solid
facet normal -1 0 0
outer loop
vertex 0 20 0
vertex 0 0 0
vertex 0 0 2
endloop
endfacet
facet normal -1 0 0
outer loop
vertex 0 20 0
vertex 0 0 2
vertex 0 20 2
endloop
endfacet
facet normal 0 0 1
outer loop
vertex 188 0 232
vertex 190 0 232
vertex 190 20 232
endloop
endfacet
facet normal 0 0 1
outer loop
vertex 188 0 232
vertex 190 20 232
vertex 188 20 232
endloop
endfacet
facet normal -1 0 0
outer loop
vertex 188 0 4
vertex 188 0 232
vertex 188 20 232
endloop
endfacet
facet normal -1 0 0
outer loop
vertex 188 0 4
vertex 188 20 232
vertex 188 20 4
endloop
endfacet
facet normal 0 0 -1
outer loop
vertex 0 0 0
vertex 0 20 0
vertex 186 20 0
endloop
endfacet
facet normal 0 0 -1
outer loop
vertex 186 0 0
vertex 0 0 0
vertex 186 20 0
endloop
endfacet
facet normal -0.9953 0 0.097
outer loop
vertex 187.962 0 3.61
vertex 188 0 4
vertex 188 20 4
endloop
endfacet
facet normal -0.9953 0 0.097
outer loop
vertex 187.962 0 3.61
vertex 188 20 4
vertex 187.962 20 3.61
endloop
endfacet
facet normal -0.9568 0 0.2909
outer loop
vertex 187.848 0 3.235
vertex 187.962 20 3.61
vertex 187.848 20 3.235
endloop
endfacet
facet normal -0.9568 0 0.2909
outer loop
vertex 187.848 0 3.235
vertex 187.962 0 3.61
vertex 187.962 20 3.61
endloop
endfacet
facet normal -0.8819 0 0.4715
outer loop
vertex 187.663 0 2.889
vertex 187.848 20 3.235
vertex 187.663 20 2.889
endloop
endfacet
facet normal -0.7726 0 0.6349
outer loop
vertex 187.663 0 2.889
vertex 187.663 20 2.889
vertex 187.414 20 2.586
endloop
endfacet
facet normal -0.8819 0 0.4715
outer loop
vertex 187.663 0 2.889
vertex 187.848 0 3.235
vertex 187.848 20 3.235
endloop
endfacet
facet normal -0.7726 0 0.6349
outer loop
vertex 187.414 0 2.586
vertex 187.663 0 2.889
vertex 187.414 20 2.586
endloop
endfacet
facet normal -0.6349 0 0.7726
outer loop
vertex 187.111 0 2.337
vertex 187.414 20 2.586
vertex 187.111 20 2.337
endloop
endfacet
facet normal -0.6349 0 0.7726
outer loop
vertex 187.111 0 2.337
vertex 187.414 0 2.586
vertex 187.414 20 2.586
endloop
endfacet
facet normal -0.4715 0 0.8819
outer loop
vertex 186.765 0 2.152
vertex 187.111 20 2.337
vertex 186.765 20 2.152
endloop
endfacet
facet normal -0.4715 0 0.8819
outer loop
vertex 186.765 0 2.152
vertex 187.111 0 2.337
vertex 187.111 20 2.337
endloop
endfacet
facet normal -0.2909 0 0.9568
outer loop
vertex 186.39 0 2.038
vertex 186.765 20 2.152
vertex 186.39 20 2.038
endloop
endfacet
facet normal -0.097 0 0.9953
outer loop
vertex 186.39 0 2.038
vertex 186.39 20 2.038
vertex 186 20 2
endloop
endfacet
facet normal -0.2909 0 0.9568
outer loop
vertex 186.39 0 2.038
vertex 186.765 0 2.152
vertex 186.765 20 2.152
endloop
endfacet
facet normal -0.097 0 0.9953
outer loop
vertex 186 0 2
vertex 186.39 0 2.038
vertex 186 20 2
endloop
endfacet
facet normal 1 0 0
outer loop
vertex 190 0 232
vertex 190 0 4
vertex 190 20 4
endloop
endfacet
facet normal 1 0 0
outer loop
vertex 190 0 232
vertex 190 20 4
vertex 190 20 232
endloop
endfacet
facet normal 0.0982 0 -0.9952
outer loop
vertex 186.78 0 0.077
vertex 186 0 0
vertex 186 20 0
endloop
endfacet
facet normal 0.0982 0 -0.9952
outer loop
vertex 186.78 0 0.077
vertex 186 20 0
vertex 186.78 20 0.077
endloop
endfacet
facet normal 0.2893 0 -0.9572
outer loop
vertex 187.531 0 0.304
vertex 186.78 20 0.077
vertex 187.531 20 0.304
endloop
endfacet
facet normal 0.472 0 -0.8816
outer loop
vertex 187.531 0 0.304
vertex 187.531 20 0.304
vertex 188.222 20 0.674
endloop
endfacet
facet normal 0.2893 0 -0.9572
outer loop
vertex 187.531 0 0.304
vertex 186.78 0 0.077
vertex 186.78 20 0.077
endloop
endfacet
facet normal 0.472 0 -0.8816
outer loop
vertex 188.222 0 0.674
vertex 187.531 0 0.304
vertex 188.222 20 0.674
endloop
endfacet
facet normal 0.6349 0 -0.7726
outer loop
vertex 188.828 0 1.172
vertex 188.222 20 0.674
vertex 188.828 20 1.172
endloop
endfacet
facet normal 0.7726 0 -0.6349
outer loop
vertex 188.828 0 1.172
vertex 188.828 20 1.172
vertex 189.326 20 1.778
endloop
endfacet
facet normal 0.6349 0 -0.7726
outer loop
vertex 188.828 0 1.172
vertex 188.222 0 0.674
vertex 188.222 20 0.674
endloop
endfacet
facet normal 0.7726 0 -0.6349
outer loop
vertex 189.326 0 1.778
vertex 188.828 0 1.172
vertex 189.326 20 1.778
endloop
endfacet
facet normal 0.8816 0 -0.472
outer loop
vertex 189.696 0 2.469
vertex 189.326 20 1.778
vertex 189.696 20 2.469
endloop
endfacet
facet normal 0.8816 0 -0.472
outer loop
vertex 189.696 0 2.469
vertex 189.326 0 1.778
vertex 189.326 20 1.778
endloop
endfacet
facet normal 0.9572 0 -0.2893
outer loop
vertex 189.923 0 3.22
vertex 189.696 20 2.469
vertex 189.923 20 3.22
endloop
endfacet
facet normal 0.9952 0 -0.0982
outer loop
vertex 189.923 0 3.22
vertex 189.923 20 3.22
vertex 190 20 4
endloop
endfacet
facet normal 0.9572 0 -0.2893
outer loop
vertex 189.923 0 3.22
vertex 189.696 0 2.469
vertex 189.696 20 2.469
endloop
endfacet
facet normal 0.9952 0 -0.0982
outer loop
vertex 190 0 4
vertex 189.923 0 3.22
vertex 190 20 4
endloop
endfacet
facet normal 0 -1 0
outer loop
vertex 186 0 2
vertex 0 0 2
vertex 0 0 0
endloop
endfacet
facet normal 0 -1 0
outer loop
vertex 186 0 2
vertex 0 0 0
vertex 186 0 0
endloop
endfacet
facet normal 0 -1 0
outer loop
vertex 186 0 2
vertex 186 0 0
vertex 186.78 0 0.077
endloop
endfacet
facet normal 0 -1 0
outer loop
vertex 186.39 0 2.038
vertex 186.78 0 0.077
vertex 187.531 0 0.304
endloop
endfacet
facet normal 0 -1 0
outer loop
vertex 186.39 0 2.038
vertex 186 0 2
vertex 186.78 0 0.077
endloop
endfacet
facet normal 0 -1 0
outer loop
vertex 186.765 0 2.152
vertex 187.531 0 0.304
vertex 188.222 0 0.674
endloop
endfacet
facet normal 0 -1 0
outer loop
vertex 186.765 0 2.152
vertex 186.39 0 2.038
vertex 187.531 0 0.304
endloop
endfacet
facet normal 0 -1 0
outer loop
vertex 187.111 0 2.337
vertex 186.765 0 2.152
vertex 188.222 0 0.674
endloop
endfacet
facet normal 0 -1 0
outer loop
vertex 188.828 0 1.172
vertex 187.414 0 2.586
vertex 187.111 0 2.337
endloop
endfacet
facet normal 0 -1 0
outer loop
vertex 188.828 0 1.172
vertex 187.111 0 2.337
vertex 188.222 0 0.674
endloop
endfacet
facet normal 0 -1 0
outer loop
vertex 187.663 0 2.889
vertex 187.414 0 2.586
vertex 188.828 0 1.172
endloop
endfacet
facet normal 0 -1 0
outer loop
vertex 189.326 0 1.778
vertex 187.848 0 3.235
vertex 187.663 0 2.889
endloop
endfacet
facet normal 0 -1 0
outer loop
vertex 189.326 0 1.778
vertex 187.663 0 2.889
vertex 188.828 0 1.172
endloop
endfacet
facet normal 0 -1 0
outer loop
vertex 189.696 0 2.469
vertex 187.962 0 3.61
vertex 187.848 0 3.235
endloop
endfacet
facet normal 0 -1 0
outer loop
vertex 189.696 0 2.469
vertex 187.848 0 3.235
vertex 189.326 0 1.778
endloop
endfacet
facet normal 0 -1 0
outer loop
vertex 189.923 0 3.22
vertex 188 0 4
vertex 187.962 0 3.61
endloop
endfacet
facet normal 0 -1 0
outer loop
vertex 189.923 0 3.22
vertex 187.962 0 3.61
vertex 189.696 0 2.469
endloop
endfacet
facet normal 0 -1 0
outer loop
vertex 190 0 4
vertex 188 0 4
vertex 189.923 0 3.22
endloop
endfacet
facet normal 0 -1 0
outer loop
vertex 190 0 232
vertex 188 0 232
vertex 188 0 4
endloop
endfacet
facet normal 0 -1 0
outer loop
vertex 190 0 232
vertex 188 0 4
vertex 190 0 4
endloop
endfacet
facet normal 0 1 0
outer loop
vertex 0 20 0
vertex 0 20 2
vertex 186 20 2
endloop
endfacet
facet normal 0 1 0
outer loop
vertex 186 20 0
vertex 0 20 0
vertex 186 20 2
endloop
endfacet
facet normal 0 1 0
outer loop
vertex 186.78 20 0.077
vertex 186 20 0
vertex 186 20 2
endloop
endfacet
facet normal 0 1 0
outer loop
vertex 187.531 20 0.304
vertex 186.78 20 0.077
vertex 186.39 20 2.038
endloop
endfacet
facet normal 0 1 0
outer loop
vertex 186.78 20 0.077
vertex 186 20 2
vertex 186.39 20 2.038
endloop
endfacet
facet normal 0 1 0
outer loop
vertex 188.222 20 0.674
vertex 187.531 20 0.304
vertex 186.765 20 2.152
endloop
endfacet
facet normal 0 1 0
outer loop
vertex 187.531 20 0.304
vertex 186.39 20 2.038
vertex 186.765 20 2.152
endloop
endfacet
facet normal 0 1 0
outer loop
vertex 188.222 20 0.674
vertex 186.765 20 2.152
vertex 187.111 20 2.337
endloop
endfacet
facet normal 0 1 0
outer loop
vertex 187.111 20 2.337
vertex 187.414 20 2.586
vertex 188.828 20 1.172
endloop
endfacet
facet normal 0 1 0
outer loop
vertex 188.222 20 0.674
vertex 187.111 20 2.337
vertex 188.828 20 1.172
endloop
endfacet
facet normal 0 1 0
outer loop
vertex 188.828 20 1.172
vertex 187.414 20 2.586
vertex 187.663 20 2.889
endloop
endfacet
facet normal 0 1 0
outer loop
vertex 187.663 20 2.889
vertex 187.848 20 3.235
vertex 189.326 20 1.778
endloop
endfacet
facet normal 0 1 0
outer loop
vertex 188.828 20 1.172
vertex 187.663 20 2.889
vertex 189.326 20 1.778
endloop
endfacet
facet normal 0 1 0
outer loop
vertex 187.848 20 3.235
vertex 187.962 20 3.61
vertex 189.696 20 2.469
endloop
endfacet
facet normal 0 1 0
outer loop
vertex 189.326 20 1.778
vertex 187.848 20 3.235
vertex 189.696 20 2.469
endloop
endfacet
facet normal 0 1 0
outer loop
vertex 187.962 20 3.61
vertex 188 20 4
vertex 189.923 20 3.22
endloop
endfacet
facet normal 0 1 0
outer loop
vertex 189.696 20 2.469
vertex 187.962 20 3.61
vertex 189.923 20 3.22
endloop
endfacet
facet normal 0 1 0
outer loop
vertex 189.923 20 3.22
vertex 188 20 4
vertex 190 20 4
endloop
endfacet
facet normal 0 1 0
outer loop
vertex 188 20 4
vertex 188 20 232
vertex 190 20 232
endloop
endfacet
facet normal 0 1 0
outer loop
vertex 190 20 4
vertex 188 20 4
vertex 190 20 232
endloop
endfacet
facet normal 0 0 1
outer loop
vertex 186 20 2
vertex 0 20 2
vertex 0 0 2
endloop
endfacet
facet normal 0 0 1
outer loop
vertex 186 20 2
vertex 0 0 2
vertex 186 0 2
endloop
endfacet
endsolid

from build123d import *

# Parameters (mm, degrees)
SKETCH_1_W                       = 190
SKETCH_1_H                       = 20
EXTRUDE_2_DEPTH                  = 2
SM_EDGE_FLANGE_2_STRIP_W         = 12
SM_EDGE_FLANGE_2_STRIP_H         = 2
SM_EDGE_FLANGE_2_STRIP_CUT_DEPTH = 20
SM_EDGE_FLANGE_2_DEPTH           = 20


# Sheet-metal steps are written as plain solids
with BuildPart() as part:
    # Эскиз1 → Бобышка-Вытянуть2 (new body)
    with BuildSketch(Plane.XY):
        with Locations((95, 10)):
            Rectangle(SKETCH_1_W, SKETCH_1_H)
    extrude(amount=EXTRUDE_2_DEPTH)

    # Ребро-кромка2 strip (across the edge) → Ребро-кромка2 strip cut (cut)
    with BuildSketch(Plane(origin=(190, 0, 2), x_dir=(-1, 0, 0), z_dir=(0, 1, 0))):
        with Locations((-2, -1)):
            Rectangle(SM_EDGE_FLANGE_2_STRIP_W, SM_EDGE_FLANGE_2_STRIP_H)
    extrude(amount=SM_EDGE_FLANGE_2_STRIP_CUT_DEPTH, mode=Mode.SUBTRACT)

    # Ребро-кромка2 section (across the edge) → Ребро-кромка2 (add)
    with BuildSketch(Plane(origin=(190, 0, 2), x_dir=(-1, 0, 0), z_dir=(0, 1, 0))):
        with BuildLine():
            Line((0, 2), (0, 230))
            Line((0, 230), (2, 230))
            Line((2, 230), (2, 2))
            ThreePointArc((2, 2), (2.585786438, 0.585786438), (4, 0))
            Line((4, 0), (4, -2))
            ThreePointArc((4, -2), (1.171572875, -0.828427125), (0, 2))
        make_face()
    extrude(amount=SM_EDGE_FLANGE_2_DEPTH)


solid = part.part
